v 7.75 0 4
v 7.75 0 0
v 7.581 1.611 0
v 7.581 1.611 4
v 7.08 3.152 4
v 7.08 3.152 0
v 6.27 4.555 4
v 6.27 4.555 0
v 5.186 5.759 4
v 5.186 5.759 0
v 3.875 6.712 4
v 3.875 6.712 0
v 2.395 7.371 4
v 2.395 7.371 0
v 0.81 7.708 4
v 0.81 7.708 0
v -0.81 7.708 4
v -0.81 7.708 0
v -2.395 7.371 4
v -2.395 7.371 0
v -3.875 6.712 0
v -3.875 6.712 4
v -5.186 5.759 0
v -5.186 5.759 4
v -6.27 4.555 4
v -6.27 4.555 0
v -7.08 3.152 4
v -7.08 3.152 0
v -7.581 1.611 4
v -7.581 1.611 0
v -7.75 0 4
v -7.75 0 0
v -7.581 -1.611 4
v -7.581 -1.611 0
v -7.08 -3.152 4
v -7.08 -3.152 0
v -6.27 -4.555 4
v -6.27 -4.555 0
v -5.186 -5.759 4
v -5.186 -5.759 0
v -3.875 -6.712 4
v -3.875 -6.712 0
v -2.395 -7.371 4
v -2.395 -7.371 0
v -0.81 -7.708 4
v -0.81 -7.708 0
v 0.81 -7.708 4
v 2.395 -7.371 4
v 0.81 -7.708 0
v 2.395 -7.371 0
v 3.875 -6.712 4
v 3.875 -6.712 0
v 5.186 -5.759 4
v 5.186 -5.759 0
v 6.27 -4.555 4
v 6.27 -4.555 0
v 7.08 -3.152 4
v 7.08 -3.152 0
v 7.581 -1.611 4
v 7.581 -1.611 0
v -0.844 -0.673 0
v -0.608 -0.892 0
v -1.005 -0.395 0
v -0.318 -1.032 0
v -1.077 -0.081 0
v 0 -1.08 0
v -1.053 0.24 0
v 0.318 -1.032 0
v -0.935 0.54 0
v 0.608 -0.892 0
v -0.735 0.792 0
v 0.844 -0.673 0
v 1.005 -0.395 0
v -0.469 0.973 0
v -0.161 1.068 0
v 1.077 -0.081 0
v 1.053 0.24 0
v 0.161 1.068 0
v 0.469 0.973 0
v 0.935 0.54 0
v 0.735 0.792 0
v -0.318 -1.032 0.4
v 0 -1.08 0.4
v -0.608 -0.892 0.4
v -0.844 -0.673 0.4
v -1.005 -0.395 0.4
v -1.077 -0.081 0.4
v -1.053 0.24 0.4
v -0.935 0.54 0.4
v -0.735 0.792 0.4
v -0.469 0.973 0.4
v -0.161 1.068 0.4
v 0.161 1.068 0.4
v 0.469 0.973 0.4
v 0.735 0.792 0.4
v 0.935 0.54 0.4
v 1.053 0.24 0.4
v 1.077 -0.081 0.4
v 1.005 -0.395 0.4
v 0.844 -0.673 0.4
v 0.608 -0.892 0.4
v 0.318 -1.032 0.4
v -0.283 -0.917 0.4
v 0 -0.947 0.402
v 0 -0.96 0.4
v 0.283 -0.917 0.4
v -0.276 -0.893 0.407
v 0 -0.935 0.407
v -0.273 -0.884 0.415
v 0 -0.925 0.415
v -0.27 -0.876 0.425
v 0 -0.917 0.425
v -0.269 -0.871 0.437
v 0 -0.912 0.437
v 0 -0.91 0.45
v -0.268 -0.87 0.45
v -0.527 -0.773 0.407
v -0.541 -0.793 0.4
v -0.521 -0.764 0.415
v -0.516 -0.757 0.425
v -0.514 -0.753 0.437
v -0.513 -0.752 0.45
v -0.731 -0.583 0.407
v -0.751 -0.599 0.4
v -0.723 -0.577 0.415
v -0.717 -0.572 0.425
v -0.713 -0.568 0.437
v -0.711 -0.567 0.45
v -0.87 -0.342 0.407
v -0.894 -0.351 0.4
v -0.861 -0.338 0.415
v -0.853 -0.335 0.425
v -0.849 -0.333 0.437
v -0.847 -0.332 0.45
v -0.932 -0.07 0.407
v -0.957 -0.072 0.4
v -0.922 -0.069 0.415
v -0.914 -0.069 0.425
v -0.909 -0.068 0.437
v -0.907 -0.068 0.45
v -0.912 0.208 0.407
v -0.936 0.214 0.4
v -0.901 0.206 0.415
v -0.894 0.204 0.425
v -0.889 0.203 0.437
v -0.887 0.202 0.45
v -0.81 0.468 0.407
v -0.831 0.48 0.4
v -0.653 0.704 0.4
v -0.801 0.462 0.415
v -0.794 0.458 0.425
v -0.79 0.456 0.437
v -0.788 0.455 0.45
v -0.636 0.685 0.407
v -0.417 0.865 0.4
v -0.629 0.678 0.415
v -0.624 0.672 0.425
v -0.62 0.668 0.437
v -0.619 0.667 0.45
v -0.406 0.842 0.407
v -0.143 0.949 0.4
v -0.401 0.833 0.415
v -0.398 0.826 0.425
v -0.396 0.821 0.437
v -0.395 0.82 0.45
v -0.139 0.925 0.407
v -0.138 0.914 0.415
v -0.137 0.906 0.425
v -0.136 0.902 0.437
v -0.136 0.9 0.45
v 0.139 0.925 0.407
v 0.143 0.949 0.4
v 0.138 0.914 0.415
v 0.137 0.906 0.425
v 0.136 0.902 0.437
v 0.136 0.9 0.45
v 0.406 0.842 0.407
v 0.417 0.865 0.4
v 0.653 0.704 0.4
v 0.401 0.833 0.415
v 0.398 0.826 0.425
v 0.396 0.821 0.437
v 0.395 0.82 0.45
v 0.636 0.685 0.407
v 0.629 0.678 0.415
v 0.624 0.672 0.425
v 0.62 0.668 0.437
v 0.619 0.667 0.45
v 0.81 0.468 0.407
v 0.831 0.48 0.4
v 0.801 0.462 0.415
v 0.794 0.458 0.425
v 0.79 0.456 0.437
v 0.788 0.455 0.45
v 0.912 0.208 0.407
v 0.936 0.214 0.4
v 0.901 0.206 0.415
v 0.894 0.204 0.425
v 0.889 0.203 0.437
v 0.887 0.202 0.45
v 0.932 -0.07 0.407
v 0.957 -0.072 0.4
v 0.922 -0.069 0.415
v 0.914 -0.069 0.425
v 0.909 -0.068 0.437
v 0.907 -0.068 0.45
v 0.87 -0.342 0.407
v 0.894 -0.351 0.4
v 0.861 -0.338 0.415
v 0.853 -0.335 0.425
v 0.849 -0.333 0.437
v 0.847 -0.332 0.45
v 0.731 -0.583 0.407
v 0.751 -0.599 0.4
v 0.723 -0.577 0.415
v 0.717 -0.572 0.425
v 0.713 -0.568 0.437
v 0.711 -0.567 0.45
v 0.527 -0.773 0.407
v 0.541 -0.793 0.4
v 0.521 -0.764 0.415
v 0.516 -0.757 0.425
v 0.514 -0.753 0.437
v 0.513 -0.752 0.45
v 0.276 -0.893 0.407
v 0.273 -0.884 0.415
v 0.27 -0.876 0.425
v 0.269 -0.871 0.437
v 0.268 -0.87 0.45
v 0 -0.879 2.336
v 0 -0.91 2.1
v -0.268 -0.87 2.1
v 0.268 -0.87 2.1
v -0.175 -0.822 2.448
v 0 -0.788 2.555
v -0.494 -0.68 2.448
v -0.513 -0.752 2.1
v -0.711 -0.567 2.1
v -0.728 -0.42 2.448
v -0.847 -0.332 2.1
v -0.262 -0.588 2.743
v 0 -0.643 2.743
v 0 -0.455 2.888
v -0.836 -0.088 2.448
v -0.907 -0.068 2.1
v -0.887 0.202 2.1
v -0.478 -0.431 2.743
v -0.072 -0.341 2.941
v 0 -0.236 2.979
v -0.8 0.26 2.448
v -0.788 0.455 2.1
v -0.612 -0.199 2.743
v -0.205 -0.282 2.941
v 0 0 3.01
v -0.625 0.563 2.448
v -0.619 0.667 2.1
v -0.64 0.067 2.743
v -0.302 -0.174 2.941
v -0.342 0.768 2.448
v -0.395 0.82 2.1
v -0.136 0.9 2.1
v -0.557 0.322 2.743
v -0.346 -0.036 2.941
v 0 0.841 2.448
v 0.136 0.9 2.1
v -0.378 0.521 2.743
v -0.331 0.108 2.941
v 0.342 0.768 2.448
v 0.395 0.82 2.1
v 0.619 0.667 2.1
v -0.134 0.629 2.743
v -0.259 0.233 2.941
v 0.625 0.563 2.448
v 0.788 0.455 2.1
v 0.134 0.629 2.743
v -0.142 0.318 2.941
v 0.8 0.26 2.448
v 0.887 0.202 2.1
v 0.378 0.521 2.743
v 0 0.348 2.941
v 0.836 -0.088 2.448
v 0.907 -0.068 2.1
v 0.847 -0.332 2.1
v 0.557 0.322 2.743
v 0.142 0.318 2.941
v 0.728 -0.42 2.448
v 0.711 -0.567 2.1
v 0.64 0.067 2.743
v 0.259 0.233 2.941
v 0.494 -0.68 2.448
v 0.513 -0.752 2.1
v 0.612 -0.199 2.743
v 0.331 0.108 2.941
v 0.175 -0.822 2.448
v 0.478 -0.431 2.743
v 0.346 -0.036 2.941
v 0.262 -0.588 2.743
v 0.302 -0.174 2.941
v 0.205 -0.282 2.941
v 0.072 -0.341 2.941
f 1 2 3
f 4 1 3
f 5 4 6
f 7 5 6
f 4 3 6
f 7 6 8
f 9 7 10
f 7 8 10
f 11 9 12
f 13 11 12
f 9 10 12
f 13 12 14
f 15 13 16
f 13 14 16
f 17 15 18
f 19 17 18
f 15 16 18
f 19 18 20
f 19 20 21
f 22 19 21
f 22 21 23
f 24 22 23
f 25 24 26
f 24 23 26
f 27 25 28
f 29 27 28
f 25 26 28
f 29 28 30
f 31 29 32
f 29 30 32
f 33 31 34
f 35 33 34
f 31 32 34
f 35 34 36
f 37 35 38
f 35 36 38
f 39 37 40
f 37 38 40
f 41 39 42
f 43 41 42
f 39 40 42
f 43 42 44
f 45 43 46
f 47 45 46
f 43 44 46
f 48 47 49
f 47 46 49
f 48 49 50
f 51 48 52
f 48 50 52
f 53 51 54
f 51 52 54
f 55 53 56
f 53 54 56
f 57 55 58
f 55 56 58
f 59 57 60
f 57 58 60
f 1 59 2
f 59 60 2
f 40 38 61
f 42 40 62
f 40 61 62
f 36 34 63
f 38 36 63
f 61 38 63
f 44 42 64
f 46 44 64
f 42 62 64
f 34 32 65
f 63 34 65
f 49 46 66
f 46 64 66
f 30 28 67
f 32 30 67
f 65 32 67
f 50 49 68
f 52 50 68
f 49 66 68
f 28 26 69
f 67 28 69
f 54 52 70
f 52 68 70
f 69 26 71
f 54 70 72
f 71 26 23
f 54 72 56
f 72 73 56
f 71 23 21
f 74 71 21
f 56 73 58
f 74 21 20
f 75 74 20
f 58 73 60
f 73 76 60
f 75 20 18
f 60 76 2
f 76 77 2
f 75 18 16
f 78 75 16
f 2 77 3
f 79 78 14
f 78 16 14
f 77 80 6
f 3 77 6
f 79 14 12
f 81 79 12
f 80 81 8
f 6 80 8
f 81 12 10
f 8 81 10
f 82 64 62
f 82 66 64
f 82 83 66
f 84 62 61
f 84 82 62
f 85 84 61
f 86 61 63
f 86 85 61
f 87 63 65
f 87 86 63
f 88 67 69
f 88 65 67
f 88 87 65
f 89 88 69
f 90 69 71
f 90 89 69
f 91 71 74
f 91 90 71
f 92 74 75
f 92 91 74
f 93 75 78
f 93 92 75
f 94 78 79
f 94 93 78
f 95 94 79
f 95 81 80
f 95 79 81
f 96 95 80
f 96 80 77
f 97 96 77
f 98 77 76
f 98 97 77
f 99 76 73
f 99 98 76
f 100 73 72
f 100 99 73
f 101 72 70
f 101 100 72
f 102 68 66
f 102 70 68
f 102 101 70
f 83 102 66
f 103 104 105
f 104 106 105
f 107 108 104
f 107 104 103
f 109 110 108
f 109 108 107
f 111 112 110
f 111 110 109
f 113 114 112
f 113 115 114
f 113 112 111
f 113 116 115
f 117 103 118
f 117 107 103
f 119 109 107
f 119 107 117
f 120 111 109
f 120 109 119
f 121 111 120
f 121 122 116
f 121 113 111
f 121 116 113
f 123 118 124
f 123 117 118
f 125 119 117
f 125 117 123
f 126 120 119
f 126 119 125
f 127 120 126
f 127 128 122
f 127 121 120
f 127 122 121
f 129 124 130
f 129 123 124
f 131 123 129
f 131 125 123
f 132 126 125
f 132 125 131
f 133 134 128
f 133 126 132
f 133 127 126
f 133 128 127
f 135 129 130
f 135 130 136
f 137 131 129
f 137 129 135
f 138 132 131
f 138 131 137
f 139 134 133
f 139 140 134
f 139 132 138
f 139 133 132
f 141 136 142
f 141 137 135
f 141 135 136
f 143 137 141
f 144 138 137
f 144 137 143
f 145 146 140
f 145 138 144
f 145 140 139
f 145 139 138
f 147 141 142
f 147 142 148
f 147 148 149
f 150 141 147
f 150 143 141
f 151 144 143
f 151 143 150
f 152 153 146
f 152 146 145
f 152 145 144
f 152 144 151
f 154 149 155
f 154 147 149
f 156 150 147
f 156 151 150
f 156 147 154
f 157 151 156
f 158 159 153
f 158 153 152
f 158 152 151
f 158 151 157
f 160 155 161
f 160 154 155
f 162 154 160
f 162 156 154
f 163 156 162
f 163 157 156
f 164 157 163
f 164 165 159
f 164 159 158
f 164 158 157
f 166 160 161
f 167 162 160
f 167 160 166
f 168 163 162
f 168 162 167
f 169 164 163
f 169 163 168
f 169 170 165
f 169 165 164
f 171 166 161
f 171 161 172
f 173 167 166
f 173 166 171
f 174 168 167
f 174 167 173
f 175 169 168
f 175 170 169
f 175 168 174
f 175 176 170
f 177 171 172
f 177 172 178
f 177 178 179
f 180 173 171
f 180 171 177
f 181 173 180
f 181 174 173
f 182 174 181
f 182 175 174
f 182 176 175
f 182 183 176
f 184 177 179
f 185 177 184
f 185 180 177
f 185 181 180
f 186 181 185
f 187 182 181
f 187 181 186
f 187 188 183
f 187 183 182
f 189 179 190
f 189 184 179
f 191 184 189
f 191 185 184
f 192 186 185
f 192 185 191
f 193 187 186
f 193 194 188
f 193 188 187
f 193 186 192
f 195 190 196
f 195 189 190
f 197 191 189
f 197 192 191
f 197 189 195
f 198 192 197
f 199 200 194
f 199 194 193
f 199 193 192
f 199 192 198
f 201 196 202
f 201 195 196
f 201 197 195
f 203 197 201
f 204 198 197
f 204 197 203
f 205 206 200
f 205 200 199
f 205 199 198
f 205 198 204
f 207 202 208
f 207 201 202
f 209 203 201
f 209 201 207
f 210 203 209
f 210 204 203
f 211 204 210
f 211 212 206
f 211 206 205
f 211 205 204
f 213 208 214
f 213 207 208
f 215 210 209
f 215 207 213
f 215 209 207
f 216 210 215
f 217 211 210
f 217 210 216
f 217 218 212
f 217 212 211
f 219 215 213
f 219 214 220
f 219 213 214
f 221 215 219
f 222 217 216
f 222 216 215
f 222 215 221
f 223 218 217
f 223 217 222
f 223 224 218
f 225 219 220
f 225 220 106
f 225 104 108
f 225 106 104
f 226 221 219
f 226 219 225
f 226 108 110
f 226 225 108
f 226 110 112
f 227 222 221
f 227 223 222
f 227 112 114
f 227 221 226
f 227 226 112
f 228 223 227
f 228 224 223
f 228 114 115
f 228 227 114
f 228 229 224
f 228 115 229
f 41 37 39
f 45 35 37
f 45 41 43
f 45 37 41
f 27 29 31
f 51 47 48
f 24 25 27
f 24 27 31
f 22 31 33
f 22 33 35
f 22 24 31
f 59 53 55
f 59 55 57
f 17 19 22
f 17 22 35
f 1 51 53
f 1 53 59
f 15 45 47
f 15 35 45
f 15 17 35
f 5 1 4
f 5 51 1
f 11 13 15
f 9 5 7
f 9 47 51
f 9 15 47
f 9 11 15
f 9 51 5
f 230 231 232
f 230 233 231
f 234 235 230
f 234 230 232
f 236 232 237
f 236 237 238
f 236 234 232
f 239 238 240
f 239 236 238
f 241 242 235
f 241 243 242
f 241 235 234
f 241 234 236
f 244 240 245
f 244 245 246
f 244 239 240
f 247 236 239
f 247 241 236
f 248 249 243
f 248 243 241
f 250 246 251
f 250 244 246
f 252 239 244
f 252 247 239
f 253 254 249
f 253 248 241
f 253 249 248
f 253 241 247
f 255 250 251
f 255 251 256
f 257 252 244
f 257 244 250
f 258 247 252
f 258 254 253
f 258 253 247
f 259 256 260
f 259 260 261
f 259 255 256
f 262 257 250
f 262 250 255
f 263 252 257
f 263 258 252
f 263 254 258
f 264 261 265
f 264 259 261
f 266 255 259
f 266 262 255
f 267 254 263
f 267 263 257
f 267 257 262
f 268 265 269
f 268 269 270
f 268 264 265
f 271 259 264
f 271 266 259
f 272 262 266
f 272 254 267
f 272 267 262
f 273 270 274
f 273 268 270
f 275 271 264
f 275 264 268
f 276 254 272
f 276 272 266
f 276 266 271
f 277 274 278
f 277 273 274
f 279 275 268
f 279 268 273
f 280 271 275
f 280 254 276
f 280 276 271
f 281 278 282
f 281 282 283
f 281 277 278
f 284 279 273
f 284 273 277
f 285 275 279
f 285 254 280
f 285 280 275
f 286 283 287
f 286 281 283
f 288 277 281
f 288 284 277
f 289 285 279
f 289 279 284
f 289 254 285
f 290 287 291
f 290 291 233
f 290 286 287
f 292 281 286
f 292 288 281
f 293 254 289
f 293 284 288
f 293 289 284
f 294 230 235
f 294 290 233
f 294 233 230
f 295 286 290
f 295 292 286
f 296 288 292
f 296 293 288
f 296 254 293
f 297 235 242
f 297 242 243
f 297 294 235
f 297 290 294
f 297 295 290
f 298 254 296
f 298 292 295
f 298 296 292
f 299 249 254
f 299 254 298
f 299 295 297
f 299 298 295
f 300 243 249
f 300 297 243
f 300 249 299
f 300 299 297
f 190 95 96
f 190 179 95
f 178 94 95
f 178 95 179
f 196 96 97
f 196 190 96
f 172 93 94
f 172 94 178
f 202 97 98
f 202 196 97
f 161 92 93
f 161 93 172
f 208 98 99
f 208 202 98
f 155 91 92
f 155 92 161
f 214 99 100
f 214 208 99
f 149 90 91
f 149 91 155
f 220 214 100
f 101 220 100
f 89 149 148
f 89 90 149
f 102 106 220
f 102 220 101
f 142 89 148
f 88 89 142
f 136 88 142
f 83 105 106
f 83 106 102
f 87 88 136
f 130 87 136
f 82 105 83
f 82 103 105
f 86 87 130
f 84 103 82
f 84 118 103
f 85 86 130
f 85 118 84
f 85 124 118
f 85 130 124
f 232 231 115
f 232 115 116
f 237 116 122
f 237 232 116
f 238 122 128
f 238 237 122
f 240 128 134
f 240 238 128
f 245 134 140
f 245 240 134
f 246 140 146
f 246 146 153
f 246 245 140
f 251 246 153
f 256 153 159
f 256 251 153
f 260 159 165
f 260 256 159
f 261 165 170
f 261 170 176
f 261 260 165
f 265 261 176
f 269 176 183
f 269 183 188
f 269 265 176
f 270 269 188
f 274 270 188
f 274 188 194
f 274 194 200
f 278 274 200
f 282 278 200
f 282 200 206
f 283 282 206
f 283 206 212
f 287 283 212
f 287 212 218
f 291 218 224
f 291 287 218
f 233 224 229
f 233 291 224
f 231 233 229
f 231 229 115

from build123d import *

# Parameters (mm, degrees)
SKETCH1_R           = 7.75
BOSS_EXTRUDE1_DEPTH = 4
FILLET1_R           = 0.05


with BuildPart() as part:
    # Sketch1 → Boss-Extrude1 (new body)
    with BuildSketch(Plane.XY):
        Circle(SKETCH1_R)
    extrude(amount=BOSS_EXTRUDE1_DEPTH)

    # Sketch2 → Cut-Revolve1 (revolve, cut)
    with BuildSketch(Plane(origin=(0, 0, 0), x_dir=(0, 0, -1), z_dir=(1, 0, 0)), mode=Mode.PRIVATE) as cut_revolve1_sk:
        with BuildLine():
            Line((-0.4, 0.91), (-2.1, 0.91))
            ThreePointArc((-2.1, 0.91), (-2.743467171, 0.643467171), (-3.01, 0))
            Line((-3.01, 0), (0.05, 0))
            Line((0.05, 0), (0.05, 1.08))
            Line((0.05, 1.08), (-0.4, 1.08))
            Line((-0.4, 1.08), (-0.4, 0.91))
        make_face()
    revolve(cut_revolve1_sk.sketch.rotate(Axis((0, 0, 3.01), (0, 0, -1)), 180), axis=Axis((0, 0, 3.01), (0, 0, -1)), mode=Mode.SUBTRACT)

    # Fillet1
    fillet1_edges = [part.edges().sort_by_distance(p)[0] for p in [
        (0, 0.91, 0.4),
    ]]
    fillet(fillet1_edges, radius=FILLET1_R)


solid = part.part
